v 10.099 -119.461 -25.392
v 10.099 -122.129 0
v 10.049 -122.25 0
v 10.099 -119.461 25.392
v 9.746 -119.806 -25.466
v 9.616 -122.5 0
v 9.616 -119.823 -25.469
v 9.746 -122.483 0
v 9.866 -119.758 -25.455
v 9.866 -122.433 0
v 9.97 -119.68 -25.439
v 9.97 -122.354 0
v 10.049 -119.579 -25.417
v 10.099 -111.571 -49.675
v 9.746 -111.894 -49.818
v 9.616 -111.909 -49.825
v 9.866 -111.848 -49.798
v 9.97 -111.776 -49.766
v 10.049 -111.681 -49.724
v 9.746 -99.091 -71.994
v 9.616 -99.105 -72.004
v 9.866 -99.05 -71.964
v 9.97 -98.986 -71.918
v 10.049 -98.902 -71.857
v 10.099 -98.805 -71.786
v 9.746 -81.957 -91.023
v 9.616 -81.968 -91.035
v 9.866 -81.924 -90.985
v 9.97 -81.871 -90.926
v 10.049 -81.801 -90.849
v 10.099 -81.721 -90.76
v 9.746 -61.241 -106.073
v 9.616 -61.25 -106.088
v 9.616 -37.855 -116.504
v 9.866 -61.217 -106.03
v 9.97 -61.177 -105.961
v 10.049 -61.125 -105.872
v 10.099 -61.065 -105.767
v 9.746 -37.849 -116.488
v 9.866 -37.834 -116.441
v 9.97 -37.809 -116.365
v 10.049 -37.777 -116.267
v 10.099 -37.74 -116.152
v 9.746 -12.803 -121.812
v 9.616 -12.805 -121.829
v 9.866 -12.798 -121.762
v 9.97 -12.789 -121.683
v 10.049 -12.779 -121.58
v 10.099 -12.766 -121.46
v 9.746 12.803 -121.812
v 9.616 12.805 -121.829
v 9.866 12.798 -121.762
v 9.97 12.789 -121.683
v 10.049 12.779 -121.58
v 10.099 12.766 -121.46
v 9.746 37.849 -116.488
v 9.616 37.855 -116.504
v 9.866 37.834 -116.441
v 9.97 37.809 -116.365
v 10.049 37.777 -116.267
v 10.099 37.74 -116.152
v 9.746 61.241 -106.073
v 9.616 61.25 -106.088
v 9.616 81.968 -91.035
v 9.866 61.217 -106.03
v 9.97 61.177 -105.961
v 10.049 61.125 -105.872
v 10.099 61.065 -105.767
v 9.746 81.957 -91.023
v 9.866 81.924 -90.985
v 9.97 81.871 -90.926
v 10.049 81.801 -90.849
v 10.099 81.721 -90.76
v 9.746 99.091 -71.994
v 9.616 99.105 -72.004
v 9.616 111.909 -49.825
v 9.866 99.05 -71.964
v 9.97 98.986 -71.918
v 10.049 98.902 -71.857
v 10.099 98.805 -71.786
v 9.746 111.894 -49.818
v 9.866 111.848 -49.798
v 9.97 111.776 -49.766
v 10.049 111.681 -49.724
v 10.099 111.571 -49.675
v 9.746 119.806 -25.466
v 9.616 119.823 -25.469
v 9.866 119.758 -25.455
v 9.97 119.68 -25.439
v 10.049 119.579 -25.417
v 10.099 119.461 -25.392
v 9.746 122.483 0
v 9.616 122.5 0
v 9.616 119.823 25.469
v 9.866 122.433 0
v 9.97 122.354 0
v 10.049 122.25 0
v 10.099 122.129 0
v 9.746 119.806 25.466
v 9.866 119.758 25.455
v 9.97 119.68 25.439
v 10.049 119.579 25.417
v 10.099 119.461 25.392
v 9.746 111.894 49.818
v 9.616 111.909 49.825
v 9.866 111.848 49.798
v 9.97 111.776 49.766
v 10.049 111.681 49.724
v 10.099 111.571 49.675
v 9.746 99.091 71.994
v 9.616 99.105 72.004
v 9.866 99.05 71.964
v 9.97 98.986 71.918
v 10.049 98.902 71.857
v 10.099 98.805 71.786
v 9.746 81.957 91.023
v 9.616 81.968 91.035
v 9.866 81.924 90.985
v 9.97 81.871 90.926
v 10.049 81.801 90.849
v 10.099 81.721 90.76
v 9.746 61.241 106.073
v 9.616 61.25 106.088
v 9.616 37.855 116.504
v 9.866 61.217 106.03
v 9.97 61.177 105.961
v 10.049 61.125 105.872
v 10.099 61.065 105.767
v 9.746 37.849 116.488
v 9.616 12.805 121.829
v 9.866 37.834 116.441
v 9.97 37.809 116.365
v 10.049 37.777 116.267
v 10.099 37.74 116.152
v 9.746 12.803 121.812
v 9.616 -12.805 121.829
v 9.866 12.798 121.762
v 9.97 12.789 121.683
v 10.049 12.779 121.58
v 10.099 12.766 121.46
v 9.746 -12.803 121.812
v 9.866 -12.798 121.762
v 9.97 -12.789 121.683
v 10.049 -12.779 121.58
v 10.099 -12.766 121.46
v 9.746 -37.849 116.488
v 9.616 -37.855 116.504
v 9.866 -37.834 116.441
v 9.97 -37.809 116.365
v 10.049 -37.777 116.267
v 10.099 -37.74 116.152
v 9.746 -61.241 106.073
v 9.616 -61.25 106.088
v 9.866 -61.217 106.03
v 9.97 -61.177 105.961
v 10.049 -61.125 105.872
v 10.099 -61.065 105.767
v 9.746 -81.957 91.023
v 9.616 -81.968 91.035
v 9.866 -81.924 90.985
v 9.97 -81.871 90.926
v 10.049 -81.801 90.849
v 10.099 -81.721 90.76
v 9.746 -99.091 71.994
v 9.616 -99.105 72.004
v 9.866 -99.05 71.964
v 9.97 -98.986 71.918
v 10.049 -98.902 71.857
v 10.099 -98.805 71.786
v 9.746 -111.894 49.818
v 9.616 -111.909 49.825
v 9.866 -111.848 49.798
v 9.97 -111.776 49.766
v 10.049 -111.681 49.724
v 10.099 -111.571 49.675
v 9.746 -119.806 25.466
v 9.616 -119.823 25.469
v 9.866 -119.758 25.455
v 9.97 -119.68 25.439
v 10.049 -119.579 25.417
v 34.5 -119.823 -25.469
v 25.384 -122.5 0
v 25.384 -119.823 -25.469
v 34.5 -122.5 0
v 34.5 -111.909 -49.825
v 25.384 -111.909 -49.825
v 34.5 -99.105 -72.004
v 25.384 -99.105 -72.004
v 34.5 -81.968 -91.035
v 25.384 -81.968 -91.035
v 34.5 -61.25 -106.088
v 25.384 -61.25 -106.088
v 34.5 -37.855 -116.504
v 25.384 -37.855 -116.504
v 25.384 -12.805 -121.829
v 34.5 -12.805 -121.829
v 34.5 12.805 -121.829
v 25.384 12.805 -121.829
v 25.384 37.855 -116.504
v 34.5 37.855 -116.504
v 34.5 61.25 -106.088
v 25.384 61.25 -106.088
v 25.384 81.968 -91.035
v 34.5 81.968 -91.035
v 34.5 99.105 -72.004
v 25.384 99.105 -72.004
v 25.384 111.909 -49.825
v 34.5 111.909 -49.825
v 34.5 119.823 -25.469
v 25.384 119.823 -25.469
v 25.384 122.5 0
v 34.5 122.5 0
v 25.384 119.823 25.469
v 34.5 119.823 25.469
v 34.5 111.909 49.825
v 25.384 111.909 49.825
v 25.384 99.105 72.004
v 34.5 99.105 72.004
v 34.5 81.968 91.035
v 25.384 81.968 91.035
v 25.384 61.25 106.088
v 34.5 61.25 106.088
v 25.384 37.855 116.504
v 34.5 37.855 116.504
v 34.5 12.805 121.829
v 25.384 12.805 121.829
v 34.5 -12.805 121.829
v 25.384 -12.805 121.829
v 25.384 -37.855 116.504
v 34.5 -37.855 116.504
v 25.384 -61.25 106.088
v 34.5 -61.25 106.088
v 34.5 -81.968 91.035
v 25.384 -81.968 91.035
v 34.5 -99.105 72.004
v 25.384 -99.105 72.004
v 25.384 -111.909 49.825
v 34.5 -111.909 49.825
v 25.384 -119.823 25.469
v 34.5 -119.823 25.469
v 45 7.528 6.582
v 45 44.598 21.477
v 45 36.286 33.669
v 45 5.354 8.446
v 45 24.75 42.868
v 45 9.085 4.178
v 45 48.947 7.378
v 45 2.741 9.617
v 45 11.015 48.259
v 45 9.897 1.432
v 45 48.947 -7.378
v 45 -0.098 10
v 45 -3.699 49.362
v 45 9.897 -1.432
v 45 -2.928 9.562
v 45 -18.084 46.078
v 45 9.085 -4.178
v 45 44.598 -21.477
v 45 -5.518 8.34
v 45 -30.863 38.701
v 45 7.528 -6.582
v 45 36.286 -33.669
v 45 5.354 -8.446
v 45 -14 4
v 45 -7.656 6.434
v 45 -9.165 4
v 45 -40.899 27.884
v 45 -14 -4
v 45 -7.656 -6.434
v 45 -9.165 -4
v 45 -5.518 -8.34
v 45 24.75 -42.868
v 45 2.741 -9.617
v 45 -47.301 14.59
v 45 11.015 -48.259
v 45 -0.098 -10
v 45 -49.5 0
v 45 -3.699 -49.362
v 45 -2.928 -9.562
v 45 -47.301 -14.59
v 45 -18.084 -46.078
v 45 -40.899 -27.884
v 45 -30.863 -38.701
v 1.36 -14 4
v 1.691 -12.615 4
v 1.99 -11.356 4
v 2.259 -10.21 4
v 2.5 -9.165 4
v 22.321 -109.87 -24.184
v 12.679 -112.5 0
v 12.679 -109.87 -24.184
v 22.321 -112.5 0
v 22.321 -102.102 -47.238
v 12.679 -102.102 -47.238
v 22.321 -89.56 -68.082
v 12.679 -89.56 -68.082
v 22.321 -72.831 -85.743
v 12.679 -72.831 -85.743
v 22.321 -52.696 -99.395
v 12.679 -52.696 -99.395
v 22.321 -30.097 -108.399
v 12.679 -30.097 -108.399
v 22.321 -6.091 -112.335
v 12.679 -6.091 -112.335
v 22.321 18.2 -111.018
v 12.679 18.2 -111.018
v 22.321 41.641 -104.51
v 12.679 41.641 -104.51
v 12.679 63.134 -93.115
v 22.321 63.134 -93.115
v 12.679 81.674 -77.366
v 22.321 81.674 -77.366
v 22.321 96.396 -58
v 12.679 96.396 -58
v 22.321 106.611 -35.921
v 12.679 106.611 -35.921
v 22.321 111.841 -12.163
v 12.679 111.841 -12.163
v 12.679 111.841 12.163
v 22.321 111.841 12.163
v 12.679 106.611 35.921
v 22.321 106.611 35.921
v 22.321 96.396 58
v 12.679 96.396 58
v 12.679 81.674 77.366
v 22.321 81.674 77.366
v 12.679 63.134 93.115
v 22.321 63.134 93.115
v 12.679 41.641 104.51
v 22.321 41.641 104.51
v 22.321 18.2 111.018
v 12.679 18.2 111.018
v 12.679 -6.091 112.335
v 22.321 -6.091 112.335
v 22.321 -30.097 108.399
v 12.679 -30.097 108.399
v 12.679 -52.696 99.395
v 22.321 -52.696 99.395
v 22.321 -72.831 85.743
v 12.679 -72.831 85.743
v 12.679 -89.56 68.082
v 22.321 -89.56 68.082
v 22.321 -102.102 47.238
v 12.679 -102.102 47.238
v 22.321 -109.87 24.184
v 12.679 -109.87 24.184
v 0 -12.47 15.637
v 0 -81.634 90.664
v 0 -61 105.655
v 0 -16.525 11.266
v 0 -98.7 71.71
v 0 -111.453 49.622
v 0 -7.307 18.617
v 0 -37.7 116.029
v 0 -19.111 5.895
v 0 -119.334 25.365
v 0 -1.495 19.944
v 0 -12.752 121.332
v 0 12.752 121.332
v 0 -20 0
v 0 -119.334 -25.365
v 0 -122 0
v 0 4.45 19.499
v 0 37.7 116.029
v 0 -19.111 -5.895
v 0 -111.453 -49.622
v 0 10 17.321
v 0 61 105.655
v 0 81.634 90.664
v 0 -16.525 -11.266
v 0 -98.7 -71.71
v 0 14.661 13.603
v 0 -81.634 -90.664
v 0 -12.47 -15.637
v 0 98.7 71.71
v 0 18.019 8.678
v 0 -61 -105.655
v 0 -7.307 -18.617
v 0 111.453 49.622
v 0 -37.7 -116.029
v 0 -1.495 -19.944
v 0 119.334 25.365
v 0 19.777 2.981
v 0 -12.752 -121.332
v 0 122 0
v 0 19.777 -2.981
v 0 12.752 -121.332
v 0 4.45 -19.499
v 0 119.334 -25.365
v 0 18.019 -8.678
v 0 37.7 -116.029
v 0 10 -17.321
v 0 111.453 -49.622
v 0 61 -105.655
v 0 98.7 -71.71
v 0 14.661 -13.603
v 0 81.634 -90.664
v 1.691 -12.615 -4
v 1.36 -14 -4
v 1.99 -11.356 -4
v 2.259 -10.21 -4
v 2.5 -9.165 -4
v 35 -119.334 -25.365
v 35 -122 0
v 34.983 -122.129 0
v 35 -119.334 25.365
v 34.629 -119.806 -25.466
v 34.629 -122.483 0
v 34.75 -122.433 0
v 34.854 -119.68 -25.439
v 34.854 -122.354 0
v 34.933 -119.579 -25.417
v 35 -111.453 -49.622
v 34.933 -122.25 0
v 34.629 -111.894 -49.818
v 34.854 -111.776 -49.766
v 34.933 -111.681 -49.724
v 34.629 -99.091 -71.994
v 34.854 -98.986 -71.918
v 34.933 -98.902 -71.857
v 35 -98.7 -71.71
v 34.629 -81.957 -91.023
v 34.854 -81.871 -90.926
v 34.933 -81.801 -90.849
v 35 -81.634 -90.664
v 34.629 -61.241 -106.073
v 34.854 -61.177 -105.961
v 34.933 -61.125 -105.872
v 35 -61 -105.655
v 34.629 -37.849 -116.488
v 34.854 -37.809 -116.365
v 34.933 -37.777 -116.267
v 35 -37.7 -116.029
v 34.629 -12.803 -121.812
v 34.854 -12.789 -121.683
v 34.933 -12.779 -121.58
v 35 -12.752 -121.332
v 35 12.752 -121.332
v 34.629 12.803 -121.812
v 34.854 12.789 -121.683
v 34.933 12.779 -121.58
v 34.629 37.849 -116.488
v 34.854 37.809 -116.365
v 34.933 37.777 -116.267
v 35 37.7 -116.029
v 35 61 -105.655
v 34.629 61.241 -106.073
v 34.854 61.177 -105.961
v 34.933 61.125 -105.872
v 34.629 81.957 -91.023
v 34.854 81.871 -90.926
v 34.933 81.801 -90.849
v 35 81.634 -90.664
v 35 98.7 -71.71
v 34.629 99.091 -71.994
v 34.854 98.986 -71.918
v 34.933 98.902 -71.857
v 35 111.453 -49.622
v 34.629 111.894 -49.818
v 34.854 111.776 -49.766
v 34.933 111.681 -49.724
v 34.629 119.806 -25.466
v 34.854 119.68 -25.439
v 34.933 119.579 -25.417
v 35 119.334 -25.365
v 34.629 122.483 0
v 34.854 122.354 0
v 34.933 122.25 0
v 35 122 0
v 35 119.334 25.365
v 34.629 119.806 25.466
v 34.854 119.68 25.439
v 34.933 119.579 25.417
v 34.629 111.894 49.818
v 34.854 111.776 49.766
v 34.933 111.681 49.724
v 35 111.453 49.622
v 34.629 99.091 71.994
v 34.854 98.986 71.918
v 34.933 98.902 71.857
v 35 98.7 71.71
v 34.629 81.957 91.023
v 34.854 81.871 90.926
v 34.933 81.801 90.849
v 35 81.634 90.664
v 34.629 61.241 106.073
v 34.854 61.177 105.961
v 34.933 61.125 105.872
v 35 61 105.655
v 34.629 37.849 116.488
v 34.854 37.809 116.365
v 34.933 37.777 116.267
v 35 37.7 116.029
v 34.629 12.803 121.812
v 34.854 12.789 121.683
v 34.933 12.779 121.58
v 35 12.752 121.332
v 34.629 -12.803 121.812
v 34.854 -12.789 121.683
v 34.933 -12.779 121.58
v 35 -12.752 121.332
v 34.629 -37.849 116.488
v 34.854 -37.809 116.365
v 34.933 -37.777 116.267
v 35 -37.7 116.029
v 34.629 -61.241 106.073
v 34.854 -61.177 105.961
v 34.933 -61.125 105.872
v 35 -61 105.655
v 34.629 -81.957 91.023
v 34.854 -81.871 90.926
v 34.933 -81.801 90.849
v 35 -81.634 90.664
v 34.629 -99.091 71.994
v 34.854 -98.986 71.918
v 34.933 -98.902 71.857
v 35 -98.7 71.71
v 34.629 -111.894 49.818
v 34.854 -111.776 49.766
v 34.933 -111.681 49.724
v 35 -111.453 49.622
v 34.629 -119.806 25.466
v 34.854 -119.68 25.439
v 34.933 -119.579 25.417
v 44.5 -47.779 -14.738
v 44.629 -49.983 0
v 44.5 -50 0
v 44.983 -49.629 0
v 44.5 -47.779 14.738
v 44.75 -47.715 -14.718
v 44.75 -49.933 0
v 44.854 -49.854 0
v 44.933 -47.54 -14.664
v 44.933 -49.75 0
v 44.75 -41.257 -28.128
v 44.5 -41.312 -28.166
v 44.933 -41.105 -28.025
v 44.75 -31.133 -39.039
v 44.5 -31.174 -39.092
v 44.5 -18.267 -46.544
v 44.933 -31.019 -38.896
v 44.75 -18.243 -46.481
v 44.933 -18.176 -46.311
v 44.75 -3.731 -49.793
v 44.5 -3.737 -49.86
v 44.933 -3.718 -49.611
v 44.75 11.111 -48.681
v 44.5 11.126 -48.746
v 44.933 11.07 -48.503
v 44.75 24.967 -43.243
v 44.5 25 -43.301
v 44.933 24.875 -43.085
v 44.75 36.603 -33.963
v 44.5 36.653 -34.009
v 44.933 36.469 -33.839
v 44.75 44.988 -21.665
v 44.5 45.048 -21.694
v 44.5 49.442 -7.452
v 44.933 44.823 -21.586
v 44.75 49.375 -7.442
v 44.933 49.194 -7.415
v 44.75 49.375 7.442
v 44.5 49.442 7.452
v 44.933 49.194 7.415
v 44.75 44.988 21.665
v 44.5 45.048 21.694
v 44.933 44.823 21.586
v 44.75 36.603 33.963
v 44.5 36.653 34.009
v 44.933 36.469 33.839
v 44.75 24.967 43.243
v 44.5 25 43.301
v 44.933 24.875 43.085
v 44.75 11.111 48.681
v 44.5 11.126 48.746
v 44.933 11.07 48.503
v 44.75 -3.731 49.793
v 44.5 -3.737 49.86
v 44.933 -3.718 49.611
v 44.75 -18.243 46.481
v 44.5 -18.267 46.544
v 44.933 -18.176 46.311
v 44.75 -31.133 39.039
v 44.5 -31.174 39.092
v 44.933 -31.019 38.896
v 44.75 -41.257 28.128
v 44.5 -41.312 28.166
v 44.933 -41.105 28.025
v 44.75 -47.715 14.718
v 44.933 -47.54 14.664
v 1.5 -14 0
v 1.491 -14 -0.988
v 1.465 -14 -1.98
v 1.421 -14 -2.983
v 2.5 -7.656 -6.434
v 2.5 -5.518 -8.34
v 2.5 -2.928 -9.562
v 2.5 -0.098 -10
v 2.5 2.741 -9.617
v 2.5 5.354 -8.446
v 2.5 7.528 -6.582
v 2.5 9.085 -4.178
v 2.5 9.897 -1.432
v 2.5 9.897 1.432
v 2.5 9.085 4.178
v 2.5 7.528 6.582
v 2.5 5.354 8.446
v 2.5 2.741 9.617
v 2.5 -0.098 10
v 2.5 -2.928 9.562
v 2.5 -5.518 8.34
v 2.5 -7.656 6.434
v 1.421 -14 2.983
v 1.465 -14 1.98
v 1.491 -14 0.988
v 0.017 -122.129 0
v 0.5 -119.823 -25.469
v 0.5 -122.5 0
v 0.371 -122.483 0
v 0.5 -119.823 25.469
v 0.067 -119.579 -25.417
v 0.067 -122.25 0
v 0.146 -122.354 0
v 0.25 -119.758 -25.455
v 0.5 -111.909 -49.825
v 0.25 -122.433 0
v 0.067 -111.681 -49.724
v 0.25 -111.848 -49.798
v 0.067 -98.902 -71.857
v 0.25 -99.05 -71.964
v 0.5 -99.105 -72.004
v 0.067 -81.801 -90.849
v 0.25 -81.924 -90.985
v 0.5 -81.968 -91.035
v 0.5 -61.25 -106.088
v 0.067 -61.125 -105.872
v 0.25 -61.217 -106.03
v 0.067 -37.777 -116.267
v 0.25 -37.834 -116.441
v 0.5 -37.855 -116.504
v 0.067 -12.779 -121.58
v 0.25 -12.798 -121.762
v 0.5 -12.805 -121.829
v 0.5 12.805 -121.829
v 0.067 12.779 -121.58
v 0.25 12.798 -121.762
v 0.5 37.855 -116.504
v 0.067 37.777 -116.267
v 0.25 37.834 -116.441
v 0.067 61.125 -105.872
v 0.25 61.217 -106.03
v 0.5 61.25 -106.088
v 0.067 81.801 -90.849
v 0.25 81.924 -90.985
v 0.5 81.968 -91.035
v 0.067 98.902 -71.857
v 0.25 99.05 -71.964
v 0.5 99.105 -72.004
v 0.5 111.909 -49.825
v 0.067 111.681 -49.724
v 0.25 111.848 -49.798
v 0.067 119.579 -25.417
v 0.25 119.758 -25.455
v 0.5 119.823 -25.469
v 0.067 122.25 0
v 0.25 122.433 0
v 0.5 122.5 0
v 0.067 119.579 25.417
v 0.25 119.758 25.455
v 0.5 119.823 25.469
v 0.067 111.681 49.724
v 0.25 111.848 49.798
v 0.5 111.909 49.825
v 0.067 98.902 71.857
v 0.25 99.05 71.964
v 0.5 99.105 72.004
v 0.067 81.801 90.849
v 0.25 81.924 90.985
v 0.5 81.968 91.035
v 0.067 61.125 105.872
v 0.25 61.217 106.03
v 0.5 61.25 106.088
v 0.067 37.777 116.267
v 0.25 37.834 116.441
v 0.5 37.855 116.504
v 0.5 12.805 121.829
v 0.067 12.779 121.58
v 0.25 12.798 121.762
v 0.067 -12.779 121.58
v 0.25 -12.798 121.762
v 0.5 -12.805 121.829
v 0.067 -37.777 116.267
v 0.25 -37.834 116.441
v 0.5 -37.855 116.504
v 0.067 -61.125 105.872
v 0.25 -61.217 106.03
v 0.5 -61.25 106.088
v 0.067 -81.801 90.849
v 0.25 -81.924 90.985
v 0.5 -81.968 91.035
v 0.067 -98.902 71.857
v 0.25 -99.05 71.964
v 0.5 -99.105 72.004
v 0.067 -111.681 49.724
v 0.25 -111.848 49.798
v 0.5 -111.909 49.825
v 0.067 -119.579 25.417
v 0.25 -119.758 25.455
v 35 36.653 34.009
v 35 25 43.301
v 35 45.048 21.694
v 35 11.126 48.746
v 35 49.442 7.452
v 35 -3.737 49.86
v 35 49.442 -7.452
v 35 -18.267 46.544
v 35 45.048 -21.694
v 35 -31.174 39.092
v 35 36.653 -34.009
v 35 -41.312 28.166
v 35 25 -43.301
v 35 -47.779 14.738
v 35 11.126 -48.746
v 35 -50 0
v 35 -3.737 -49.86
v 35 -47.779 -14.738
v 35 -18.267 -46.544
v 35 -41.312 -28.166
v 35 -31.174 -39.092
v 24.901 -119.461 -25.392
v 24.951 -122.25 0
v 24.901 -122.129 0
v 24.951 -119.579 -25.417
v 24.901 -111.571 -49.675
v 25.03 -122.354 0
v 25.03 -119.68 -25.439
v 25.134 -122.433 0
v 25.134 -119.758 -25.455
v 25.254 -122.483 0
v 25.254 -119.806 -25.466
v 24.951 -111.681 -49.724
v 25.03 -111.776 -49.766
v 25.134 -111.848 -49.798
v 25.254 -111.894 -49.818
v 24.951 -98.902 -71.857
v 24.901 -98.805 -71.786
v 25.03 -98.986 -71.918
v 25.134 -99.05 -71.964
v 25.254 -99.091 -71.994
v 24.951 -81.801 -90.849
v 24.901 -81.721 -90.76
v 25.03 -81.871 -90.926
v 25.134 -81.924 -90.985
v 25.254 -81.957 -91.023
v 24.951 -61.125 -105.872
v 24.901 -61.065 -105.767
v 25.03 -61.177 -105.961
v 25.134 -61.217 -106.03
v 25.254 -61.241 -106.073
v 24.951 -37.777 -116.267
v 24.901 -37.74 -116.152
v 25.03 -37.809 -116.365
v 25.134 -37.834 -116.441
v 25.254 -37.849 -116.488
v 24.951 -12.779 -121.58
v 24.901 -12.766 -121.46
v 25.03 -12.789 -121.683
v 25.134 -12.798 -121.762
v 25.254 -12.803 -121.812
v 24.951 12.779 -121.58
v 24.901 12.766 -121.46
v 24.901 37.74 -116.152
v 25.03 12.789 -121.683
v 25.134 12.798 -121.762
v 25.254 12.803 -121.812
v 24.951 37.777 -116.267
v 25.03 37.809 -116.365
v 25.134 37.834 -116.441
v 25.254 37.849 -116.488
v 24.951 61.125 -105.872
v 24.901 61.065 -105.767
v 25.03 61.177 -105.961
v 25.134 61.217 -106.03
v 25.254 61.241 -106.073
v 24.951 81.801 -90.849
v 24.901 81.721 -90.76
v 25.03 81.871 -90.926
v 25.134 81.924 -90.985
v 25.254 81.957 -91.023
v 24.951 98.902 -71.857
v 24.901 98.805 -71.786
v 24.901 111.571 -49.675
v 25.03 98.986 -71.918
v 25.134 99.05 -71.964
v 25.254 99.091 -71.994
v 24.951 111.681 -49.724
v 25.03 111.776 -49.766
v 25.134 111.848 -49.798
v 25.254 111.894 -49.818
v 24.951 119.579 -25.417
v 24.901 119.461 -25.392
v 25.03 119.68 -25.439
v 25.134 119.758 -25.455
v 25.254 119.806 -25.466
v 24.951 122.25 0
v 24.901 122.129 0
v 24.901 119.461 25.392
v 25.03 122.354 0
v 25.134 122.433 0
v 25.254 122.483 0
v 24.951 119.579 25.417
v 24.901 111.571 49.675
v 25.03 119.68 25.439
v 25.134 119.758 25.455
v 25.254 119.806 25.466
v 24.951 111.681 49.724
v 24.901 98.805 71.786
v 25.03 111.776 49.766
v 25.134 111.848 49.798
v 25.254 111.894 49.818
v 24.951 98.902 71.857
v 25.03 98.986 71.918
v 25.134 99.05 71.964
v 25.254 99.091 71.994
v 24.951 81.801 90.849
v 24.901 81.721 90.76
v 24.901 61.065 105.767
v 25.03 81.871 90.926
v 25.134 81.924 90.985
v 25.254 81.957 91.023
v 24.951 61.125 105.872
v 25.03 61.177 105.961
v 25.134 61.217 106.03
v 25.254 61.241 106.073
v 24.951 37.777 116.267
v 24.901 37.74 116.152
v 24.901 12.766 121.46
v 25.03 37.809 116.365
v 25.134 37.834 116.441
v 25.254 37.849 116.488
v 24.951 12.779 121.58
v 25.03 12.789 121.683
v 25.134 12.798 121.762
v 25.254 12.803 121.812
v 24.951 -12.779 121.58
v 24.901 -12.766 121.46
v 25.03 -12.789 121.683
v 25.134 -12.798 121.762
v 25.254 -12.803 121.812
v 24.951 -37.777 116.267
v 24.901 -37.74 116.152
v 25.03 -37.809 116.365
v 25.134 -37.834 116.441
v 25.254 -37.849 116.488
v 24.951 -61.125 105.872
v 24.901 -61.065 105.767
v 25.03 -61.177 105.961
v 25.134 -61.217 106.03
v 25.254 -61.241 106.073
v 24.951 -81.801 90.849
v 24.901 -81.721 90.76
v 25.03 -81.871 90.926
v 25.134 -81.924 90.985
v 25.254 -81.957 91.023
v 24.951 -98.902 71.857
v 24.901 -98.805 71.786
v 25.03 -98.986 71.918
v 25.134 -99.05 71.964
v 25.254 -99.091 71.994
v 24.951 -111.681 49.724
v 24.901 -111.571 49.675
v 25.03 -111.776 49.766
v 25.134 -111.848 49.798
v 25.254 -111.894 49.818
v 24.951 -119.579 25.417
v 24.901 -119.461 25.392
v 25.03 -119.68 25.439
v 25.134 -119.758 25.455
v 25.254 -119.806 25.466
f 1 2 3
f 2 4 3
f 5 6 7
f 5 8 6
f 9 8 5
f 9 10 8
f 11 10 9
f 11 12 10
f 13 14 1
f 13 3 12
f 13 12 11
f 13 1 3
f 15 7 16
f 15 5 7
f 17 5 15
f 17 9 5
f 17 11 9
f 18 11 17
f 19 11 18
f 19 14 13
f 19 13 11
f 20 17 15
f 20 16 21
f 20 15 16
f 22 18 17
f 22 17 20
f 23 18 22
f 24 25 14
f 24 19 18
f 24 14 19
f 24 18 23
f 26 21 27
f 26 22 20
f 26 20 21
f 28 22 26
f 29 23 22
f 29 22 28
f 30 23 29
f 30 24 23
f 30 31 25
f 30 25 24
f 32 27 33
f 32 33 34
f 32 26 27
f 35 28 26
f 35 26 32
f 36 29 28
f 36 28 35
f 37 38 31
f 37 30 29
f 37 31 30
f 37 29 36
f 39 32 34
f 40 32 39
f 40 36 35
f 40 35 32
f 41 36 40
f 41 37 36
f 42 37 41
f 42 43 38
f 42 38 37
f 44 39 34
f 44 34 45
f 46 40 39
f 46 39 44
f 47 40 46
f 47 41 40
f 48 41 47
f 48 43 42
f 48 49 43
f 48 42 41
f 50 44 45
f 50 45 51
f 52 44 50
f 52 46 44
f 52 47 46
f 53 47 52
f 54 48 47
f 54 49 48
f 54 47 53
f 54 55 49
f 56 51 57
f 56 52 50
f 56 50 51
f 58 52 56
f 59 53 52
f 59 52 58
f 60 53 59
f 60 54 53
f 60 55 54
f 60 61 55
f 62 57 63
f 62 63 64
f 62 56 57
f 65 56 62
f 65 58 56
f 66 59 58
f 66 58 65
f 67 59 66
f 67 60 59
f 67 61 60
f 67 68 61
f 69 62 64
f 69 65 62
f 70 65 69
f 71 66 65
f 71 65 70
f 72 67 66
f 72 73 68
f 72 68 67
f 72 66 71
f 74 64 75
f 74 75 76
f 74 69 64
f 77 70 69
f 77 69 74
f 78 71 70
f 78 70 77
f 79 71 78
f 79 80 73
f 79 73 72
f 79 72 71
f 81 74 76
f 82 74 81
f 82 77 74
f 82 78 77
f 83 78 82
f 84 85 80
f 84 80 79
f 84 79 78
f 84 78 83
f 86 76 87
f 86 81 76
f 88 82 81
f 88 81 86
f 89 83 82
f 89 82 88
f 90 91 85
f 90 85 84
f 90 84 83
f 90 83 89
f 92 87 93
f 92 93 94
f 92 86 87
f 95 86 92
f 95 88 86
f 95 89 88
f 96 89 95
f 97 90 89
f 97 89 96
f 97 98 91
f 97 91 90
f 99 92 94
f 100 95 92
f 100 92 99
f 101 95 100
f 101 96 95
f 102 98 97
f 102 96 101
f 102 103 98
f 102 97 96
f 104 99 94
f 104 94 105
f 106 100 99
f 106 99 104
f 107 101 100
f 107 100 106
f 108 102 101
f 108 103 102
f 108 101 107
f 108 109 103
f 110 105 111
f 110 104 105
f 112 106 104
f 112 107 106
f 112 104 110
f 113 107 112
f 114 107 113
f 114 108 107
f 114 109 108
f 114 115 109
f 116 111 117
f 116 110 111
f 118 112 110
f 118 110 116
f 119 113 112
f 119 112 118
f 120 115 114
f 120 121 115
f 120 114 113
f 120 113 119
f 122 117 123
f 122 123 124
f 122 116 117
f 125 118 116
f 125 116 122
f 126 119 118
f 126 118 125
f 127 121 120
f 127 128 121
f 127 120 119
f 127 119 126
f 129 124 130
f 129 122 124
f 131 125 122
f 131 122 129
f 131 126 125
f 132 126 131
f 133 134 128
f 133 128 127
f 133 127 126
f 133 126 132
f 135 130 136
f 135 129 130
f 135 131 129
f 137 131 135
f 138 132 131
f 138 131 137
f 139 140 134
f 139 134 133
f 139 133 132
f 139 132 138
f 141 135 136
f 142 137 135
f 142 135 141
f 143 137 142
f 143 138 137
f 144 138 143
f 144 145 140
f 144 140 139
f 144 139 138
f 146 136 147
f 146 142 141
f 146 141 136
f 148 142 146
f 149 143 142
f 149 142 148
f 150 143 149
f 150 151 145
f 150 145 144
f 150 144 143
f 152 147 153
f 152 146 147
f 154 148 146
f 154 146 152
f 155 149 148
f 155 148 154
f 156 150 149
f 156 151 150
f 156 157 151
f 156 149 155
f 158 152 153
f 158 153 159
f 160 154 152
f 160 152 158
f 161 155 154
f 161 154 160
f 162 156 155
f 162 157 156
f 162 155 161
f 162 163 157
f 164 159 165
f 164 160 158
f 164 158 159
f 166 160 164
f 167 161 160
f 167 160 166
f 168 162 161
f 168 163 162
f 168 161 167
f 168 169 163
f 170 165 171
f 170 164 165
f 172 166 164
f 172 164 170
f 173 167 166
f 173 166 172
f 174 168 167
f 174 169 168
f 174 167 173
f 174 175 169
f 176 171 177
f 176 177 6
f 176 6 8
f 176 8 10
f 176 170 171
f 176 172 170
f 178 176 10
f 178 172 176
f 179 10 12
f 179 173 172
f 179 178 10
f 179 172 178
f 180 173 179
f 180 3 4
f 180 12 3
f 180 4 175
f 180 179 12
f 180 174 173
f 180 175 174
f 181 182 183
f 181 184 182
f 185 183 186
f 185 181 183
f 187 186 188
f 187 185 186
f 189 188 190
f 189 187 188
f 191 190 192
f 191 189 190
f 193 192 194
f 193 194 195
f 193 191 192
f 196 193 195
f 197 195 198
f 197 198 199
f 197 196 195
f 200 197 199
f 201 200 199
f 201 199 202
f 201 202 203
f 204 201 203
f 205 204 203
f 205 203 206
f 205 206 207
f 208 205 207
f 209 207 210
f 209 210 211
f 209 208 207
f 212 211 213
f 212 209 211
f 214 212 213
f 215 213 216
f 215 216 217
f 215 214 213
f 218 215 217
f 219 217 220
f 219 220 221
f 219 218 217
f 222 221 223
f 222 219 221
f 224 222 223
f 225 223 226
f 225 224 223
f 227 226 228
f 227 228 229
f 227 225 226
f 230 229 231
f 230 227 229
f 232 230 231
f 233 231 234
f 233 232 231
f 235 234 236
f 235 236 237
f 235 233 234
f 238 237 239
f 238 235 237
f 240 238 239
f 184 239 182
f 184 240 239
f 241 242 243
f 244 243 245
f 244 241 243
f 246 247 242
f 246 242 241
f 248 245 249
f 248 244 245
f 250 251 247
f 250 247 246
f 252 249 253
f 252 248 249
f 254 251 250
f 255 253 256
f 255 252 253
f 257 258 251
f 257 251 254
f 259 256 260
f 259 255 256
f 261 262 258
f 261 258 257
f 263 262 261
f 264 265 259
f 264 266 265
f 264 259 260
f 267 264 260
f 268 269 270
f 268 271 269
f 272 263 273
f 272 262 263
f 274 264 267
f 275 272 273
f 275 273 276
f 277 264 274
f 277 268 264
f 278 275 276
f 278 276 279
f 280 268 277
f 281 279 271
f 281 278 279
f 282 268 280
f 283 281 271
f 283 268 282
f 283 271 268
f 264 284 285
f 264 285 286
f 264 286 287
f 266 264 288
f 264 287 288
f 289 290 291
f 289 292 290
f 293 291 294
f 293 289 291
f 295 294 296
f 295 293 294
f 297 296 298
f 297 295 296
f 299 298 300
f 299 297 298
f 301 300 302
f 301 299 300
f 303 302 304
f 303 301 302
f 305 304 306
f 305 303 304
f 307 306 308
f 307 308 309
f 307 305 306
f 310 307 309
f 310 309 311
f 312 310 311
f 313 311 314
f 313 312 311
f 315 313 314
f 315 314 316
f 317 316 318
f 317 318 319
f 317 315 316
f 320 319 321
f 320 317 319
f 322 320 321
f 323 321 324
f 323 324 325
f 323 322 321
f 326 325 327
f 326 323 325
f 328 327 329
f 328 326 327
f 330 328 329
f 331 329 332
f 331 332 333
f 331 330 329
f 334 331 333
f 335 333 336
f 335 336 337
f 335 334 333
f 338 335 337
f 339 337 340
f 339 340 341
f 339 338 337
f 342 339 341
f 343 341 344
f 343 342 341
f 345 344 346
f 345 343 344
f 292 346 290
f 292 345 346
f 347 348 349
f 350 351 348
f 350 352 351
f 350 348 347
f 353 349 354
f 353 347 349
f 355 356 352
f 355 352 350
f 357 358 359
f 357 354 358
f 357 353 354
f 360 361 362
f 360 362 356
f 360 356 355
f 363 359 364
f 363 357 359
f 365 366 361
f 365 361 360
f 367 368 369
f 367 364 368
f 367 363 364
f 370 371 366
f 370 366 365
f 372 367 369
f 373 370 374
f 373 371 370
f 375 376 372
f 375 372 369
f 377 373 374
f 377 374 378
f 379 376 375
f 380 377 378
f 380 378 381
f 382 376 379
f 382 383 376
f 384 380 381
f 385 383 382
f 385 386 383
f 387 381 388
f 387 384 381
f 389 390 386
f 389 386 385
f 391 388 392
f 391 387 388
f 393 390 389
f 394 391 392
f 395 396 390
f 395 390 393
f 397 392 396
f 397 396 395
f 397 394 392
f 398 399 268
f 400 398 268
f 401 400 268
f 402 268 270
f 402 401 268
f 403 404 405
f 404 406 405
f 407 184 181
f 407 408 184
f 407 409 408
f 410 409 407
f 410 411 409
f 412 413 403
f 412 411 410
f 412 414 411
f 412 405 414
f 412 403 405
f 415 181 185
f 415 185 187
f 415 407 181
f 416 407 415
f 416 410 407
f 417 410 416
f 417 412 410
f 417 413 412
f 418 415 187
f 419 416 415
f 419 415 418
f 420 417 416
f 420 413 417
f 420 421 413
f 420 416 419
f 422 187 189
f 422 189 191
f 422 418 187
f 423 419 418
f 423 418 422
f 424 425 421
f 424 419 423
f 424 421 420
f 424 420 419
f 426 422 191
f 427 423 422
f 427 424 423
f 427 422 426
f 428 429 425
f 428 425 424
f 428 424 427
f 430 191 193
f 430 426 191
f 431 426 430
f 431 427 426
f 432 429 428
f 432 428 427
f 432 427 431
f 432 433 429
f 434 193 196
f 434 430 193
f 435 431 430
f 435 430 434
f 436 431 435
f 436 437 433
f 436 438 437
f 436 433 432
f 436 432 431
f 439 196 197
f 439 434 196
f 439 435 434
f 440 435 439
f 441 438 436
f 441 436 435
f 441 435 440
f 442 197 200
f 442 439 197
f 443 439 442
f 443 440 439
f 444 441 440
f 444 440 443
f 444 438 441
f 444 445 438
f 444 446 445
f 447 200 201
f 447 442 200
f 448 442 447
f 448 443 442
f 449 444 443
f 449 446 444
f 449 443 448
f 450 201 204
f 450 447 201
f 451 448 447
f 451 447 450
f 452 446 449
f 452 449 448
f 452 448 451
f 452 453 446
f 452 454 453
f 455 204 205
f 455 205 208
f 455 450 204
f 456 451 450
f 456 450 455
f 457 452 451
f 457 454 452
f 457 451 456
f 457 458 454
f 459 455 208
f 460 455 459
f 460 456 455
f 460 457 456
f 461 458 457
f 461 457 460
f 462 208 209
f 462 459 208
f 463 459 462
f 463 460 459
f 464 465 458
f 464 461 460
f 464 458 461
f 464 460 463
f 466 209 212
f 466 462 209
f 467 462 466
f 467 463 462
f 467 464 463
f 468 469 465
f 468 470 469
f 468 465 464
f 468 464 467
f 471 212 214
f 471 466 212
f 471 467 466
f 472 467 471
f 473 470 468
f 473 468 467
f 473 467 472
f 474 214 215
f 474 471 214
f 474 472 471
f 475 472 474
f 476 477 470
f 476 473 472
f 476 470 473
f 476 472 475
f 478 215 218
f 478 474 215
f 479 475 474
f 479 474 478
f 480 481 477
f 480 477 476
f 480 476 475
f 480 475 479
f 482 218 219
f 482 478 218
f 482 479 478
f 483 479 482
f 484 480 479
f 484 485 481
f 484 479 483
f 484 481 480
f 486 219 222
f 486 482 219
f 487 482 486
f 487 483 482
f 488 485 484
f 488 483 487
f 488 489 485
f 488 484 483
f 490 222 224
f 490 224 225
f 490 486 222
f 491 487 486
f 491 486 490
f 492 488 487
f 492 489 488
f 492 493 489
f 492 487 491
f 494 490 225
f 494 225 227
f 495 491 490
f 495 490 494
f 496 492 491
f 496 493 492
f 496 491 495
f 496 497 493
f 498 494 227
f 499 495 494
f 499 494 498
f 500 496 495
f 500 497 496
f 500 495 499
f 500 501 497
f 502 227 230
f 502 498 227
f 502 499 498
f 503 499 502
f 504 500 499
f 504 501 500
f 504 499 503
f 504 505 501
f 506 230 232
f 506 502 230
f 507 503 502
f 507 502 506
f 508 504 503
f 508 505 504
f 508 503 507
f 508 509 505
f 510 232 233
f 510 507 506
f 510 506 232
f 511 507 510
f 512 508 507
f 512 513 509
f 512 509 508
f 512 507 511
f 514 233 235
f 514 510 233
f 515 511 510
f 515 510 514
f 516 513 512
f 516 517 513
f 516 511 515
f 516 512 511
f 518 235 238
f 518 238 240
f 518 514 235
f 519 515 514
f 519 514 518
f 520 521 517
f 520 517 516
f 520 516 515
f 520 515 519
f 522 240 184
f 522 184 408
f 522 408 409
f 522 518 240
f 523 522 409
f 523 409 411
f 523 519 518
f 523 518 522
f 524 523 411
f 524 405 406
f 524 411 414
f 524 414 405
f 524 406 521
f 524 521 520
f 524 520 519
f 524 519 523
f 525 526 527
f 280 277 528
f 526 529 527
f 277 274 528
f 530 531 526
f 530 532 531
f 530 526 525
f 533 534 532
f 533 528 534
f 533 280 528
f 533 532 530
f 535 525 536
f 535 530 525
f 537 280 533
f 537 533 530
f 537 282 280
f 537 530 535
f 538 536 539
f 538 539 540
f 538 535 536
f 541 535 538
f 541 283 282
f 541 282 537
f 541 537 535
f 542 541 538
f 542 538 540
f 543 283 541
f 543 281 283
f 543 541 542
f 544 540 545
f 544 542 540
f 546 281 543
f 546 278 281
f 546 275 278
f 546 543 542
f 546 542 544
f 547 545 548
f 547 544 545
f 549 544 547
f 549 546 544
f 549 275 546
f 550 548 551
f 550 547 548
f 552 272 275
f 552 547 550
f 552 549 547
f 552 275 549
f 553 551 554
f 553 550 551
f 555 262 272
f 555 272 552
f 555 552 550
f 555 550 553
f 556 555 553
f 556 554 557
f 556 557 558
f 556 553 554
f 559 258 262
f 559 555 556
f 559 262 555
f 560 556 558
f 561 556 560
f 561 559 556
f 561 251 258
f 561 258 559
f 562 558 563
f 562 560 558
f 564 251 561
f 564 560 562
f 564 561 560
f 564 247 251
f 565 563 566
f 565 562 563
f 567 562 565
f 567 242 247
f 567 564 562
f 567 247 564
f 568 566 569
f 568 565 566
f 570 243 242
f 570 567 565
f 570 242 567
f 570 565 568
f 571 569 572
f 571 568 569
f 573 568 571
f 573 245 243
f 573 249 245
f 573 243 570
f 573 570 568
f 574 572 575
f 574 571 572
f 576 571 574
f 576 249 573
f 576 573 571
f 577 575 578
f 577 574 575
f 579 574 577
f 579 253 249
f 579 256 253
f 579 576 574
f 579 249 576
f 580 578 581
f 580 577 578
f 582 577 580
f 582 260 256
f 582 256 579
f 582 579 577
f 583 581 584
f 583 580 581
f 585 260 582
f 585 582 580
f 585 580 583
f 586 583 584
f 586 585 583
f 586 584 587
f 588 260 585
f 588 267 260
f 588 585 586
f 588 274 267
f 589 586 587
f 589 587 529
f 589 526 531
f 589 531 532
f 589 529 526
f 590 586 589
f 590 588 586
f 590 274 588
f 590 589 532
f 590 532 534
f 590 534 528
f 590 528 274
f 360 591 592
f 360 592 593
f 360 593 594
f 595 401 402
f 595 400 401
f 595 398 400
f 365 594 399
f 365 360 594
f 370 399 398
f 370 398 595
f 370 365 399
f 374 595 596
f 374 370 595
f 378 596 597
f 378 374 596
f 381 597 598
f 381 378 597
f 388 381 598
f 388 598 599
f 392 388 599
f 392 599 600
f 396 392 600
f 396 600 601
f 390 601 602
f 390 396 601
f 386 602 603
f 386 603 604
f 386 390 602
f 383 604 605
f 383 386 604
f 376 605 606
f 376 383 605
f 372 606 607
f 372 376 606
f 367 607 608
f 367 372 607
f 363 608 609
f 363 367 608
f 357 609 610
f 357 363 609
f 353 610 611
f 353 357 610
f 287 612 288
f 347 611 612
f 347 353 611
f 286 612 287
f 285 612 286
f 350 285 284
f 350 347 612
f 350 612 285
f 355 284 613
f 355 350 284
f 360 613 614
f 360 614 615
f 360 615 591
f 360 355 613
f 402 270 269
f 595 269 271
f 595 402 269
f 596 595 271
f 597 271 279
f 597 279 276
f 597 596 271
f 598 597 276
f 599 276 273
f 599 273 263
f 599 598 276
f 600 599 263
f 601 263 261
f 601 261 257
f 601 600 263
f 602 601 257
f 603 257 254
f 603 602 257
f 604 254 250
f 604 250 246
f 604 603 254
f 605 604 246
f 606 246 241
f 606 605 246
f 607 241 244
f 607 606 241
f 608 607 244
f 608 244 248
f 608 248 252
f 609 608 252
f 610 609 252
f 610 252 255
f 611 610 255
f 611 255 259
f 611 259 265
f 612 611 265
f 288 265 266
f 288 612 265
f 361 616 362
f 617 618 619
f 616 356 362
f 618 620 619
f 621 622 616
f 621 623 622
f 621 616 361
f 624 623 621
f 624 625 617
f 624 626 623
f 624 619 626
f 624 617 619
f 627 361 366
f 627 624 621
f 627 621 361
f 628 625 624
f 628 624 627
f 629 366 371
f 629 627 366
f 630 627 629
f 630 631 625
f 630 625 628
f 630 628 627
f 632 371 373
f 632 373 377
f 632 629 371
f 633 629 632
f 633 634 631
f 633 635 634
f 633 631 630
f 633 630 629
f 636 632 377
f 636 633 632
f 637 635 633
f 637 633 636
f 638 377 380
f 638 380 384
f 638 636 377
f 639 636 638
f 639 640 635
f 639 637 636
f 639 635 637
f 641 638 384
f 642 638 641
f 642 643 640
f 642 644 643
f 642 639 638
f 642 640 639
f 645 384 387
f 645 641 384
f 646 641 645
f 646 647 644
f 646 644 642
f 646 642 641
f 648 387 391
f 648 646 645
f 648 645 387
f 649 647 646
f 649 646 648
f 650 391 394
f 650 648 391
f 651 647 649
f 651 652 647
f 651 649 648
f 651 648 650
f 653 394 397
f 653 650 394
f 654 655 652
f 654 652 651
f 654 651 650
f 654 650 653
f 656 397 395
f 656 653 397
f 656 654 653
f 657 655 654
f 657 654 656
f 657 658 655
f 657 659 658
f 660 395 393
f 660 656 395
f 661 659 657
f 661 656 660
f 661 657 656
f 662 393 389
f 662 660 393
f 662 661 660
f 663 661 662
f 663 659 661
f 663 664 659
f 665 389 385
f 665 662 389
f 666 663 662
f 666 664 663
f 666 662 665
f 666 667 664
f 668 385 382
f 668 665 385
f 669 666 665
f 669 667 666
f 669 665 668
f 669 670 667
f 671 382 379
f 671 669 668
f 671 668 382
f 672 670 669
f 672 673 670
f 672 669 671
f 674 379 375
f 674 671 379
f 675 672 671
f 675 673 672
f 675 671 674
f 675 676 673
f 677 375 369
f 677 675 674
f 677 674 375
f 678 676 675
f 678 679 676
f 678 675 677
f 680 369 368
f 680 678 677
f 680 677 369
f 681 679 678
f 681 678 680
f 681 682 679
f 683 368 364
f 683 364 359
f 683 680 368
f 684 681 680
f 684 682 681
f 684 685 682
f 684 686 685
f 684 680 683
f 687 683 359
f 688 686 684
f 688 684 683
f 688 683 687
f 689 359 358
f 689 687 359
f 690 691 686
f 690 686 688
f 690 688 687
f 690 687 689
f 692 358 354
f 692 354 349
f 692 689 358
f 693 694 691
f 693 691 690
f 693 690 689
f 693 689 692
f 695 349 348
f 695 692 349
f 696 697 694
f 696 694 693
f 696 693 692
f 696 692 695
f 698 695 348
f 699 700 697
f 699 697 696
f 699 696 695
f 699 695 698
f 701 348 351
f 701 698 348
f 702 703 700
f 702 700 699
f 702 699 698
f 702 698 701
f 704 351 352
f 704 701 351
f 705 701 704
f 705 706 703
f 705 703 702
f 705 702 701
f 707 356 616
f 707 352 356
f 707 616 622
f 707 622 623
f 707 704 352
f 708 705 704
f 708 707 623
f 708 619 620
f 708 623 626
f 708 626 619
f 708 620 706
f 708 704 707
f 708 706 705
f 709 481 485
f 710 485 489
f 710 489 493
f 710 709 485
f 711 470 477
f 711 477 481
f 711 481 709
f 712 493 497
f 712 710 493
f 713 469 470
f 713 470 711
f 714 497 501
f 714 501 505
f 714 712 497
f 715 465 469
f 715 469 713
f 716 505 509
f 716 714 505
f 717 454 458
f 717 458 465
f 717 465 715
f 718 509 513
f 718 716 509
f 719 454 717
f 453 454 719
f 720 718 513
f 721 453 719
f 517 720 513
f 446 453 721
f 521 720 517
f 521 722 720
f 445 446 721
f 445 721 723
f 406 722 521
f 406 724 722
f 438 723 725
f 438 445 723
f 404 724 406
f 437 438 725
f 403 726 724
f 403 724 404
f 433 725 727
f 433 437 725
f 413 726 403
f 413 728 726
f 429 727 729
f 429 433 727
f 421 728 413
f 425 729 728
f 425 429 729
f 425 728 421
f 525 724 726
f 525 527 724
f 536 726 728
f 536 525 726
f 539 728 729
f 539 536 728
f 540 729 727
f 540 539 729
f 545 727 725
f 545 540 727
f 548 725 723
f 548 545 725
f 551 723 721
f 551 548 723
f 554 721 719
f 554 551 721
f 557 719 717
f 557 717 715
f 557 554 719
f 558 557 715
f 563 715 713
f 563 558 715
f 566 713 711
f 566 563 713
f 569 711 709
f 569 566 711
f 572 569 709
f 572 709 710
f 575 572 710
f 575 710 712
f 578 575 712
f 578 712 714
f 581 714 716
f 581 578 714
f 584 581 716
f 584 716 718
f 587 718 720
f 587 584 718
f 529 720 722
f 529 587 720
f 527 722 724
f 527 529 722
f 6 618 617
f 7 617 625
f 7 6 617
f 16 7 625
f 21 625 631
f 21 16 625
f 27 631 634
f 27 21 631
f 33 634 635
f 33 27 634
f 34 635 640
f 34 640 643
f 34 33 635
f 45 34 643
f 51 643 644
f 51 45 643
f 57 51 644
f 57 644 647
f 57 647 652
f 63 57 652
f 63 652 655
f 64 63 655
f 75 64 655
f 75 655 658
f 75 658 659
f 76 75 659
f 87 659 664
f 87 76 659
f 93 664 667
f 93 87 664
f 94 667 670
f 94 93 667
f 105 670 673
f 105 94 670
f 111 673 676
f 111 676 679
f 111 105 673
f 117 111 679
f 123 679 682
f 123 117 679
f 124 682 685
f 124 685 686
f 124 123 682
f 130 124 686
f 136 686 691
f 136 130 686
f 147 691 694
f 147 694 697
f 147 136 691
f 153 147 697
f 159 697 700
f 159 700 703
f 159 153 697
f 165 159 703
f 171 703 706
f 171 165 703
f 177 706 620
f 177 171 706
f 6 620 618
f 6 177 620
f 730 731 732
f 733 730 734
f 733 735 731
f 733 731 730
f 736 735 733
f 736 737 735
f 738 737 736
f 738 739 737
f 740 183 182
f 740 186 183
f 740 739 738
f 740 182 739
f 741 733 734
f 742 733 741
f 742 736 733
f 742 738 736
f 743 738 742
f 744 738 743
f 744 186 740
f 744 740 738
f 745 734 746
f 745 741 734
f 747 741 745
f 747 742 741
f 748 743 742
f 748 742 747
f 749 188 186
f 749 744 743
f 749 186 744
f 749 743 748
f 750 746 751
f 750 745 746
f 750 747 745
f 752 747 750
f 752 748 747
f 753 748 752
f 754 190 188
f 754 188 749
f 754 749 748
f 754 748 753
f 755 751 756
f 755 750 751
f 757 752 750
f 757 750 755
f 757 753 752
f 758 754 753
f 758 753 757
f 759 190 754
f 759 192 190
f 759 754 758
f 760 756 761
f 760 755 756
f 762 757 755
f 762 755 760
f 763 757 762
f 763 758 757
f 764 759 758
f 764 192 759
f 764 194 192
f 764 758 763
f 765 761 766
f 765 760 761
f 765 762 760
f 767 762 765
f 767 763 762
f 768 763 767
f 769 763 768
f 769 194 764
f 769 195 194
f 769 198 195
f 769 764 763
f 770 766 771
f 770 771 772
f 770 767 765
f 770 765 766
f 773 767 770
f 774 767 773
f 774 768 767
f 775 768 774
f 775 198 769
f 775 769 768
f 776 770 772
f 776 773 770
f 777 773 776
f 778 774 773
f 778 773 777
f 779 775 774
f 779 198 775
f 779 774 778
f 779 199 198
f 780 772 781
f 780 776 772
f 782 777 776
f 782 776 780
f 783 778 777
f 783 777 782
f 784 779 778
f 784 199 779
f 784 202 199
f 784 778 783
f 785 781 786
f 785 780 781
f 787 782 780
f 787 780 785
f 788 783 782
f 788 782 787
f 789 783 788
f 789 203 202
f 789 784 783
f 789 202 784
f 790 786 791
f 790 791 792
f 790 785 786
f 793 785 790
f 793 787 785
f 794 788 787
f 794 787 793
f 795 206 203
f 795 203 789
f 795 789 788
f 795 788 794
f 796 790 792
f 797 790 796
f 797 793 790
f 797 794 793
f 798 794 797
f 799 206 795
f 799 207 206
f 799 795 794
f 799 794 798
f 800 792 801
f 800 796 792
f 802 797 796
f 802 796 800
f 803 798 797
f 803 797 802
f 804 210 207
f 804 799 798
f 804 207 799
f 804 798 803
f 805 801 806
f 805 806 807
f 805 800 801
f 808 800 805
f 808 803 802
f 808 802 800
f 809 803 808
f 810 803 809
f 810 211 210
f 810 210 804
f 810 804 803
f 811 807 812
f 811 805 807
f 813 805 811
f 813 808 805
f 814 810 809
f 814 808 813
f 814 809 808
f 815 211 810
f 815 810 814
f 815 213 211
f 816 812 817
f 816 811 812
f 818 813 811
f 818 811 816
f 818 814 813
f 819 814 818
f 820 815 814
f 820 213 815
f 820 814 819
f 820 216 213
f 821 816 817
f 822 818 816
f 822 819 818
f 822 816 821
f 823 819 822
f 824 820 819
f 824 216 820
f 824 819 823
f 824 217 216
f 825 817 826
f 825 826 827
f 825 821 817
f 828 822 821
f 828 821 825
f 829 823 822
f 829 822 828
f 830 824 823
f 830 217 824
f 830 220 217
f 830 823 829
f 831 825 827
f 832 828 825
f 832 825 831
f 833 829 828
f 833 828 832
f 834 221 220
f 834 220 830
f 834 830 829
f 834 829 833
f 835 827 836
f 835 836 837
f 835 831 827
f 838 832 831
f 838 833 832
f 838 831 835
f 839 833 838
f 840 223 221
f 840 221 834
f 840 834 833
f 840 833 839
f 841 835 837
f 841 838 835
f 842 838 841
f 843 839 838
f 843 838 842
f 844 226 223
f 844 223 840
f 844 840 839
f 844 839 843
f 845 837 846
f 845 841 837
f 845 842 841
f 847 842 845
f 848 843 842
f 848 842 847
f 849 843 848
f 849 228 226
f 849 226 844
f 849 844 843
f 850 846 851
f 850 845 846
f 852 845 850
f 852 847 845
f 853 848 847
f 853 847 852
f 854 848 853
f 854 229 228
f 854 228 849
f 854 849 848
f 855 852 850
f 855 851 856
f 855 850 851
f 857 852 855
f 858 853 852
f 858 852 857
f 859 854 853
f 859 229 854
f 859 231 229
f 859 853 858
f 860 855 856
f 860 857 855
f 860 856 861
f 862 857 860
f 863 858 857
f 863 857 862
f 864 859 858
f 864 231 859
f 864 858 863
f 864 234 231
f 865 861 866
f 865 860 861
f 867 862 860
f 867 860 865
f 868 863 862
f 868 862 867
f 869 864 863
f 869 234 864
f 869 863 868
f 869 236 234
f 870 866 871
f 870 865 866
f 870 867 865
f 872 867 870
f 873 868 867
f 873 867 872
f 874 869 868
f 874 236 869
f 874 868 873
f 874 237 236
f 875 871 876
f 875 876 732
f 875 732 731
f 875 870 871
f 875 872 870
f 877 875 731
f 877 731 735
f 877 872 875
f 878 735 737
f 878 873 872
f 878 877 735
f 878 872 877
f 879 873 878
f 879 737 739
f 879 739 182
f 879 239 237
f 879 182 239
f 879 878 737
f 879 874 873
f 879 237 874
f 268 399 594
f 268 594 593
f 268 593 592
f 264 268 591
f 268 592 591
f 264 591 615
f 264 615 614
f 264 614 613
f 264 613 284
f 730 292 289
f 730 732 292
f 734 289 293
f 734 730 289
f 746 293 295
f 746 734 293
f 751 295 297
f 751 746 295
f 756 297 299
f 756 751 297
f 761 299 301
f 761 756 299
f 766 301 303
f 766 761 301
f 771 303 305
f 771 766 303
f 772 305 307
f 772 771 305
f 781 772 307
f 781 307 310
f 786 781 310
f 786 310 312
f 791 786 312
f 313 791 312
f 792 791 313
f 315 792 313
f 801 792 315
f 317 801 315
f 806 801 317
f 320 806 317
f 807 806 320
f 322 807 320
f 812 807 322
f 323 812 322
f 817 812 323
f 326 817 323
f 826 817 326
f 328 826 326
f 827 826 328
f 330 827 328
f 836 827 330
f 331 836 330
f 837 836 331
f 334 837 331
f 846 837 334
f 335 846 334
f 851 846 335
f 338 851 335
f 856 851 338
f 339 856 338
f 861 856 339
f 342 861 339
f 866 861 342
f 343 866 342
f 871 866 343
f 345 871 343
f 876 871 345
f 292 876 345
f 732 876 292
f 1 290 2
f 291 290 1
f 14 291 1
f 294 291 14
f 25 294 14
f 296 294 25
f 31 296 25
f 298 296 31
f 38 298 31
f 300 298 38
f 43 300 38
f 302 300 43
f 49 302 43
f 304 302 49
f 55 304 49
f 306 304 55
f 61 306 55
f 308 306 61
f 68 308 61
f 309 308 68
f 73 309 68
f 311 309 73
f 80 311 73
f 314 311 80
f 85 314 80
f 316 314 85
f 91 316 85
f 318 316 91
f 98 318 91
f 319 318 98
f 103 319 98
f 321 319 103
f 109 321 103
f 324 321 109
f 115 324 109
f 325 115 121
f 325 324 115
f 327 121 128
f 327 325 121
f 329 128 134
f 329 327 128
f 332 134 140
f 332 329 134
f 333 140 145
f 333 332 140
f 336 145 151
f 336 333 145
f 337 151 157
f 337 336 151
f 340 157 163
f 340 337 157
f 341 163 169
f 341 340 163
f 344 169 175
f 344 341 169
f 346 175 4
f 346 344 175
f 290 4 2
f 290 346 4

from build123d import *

# Parameters (mm, degrees)
ESBO_O1_W             = 8
ESBO_O1_H             = 8
CORTE_EXTRUS_O1_DEPTH = 46


with BuildPart() as part:
    # Sketch1 → Revolve1 (revolve)
    with BuildSketch(Plane.XY):
        with BuildLine():
            Line((0, -20), (0, -122))
            ThreePointArc((0, -122), (0.146446609, -122.353553391), (0.5, -122.5))
            Line((0.5, -122.5), (9.616336506, -122.5))
            ThreePointArc((9.616336506, -122.5), (9.920717221, -122.39667667), (10.099299419, -122.129409523))
            Line((10.099299419, -122.129409523), (12.679491924, -112.5))
            Line((12.679491924, -112.5), (22.320508076, -112.5))
            Line((22.320508076, -112.5), (24.900700581, -122.129409523))
            ThreePointArc((24.900700581, -122.129409523), (25.079282779, -122.39667667), (25.383663494, -122.5))
            Line((25.383663494, -122.5), (34.5, -122.5))
            ThreePointArc((34.5, -122.5), (34.853553391, -122.353553391), (35, -122))
            Line((35, -122), (35, -50))
            Line((35, -50), (44.5, -50))
            ThreePointArc((44.5, -50), (44.853553391, -49.853553391), (45, -49.5))
            Line((45, -49.5), (45, -10))
            Line((45, -10), (2.5, -10))
            Line((2.5, -10), (0, -20))
        make_face()
    revolve(axis=Axis((0, 0, 0), (1, 0, 0)))

    # Esboço1 → Corte-extrusão1 (cut, through all)
    with BuildSketch(Plane.ZY):
        with Locations((0, -10)):
            Rectangle(ESBO_O1_W, ESBO_O1_H)
    extrude(amount=-CORTE_EXTRUS_O1_DEPTH, mode=Mode.SUBTRACT)


solid = part.part
